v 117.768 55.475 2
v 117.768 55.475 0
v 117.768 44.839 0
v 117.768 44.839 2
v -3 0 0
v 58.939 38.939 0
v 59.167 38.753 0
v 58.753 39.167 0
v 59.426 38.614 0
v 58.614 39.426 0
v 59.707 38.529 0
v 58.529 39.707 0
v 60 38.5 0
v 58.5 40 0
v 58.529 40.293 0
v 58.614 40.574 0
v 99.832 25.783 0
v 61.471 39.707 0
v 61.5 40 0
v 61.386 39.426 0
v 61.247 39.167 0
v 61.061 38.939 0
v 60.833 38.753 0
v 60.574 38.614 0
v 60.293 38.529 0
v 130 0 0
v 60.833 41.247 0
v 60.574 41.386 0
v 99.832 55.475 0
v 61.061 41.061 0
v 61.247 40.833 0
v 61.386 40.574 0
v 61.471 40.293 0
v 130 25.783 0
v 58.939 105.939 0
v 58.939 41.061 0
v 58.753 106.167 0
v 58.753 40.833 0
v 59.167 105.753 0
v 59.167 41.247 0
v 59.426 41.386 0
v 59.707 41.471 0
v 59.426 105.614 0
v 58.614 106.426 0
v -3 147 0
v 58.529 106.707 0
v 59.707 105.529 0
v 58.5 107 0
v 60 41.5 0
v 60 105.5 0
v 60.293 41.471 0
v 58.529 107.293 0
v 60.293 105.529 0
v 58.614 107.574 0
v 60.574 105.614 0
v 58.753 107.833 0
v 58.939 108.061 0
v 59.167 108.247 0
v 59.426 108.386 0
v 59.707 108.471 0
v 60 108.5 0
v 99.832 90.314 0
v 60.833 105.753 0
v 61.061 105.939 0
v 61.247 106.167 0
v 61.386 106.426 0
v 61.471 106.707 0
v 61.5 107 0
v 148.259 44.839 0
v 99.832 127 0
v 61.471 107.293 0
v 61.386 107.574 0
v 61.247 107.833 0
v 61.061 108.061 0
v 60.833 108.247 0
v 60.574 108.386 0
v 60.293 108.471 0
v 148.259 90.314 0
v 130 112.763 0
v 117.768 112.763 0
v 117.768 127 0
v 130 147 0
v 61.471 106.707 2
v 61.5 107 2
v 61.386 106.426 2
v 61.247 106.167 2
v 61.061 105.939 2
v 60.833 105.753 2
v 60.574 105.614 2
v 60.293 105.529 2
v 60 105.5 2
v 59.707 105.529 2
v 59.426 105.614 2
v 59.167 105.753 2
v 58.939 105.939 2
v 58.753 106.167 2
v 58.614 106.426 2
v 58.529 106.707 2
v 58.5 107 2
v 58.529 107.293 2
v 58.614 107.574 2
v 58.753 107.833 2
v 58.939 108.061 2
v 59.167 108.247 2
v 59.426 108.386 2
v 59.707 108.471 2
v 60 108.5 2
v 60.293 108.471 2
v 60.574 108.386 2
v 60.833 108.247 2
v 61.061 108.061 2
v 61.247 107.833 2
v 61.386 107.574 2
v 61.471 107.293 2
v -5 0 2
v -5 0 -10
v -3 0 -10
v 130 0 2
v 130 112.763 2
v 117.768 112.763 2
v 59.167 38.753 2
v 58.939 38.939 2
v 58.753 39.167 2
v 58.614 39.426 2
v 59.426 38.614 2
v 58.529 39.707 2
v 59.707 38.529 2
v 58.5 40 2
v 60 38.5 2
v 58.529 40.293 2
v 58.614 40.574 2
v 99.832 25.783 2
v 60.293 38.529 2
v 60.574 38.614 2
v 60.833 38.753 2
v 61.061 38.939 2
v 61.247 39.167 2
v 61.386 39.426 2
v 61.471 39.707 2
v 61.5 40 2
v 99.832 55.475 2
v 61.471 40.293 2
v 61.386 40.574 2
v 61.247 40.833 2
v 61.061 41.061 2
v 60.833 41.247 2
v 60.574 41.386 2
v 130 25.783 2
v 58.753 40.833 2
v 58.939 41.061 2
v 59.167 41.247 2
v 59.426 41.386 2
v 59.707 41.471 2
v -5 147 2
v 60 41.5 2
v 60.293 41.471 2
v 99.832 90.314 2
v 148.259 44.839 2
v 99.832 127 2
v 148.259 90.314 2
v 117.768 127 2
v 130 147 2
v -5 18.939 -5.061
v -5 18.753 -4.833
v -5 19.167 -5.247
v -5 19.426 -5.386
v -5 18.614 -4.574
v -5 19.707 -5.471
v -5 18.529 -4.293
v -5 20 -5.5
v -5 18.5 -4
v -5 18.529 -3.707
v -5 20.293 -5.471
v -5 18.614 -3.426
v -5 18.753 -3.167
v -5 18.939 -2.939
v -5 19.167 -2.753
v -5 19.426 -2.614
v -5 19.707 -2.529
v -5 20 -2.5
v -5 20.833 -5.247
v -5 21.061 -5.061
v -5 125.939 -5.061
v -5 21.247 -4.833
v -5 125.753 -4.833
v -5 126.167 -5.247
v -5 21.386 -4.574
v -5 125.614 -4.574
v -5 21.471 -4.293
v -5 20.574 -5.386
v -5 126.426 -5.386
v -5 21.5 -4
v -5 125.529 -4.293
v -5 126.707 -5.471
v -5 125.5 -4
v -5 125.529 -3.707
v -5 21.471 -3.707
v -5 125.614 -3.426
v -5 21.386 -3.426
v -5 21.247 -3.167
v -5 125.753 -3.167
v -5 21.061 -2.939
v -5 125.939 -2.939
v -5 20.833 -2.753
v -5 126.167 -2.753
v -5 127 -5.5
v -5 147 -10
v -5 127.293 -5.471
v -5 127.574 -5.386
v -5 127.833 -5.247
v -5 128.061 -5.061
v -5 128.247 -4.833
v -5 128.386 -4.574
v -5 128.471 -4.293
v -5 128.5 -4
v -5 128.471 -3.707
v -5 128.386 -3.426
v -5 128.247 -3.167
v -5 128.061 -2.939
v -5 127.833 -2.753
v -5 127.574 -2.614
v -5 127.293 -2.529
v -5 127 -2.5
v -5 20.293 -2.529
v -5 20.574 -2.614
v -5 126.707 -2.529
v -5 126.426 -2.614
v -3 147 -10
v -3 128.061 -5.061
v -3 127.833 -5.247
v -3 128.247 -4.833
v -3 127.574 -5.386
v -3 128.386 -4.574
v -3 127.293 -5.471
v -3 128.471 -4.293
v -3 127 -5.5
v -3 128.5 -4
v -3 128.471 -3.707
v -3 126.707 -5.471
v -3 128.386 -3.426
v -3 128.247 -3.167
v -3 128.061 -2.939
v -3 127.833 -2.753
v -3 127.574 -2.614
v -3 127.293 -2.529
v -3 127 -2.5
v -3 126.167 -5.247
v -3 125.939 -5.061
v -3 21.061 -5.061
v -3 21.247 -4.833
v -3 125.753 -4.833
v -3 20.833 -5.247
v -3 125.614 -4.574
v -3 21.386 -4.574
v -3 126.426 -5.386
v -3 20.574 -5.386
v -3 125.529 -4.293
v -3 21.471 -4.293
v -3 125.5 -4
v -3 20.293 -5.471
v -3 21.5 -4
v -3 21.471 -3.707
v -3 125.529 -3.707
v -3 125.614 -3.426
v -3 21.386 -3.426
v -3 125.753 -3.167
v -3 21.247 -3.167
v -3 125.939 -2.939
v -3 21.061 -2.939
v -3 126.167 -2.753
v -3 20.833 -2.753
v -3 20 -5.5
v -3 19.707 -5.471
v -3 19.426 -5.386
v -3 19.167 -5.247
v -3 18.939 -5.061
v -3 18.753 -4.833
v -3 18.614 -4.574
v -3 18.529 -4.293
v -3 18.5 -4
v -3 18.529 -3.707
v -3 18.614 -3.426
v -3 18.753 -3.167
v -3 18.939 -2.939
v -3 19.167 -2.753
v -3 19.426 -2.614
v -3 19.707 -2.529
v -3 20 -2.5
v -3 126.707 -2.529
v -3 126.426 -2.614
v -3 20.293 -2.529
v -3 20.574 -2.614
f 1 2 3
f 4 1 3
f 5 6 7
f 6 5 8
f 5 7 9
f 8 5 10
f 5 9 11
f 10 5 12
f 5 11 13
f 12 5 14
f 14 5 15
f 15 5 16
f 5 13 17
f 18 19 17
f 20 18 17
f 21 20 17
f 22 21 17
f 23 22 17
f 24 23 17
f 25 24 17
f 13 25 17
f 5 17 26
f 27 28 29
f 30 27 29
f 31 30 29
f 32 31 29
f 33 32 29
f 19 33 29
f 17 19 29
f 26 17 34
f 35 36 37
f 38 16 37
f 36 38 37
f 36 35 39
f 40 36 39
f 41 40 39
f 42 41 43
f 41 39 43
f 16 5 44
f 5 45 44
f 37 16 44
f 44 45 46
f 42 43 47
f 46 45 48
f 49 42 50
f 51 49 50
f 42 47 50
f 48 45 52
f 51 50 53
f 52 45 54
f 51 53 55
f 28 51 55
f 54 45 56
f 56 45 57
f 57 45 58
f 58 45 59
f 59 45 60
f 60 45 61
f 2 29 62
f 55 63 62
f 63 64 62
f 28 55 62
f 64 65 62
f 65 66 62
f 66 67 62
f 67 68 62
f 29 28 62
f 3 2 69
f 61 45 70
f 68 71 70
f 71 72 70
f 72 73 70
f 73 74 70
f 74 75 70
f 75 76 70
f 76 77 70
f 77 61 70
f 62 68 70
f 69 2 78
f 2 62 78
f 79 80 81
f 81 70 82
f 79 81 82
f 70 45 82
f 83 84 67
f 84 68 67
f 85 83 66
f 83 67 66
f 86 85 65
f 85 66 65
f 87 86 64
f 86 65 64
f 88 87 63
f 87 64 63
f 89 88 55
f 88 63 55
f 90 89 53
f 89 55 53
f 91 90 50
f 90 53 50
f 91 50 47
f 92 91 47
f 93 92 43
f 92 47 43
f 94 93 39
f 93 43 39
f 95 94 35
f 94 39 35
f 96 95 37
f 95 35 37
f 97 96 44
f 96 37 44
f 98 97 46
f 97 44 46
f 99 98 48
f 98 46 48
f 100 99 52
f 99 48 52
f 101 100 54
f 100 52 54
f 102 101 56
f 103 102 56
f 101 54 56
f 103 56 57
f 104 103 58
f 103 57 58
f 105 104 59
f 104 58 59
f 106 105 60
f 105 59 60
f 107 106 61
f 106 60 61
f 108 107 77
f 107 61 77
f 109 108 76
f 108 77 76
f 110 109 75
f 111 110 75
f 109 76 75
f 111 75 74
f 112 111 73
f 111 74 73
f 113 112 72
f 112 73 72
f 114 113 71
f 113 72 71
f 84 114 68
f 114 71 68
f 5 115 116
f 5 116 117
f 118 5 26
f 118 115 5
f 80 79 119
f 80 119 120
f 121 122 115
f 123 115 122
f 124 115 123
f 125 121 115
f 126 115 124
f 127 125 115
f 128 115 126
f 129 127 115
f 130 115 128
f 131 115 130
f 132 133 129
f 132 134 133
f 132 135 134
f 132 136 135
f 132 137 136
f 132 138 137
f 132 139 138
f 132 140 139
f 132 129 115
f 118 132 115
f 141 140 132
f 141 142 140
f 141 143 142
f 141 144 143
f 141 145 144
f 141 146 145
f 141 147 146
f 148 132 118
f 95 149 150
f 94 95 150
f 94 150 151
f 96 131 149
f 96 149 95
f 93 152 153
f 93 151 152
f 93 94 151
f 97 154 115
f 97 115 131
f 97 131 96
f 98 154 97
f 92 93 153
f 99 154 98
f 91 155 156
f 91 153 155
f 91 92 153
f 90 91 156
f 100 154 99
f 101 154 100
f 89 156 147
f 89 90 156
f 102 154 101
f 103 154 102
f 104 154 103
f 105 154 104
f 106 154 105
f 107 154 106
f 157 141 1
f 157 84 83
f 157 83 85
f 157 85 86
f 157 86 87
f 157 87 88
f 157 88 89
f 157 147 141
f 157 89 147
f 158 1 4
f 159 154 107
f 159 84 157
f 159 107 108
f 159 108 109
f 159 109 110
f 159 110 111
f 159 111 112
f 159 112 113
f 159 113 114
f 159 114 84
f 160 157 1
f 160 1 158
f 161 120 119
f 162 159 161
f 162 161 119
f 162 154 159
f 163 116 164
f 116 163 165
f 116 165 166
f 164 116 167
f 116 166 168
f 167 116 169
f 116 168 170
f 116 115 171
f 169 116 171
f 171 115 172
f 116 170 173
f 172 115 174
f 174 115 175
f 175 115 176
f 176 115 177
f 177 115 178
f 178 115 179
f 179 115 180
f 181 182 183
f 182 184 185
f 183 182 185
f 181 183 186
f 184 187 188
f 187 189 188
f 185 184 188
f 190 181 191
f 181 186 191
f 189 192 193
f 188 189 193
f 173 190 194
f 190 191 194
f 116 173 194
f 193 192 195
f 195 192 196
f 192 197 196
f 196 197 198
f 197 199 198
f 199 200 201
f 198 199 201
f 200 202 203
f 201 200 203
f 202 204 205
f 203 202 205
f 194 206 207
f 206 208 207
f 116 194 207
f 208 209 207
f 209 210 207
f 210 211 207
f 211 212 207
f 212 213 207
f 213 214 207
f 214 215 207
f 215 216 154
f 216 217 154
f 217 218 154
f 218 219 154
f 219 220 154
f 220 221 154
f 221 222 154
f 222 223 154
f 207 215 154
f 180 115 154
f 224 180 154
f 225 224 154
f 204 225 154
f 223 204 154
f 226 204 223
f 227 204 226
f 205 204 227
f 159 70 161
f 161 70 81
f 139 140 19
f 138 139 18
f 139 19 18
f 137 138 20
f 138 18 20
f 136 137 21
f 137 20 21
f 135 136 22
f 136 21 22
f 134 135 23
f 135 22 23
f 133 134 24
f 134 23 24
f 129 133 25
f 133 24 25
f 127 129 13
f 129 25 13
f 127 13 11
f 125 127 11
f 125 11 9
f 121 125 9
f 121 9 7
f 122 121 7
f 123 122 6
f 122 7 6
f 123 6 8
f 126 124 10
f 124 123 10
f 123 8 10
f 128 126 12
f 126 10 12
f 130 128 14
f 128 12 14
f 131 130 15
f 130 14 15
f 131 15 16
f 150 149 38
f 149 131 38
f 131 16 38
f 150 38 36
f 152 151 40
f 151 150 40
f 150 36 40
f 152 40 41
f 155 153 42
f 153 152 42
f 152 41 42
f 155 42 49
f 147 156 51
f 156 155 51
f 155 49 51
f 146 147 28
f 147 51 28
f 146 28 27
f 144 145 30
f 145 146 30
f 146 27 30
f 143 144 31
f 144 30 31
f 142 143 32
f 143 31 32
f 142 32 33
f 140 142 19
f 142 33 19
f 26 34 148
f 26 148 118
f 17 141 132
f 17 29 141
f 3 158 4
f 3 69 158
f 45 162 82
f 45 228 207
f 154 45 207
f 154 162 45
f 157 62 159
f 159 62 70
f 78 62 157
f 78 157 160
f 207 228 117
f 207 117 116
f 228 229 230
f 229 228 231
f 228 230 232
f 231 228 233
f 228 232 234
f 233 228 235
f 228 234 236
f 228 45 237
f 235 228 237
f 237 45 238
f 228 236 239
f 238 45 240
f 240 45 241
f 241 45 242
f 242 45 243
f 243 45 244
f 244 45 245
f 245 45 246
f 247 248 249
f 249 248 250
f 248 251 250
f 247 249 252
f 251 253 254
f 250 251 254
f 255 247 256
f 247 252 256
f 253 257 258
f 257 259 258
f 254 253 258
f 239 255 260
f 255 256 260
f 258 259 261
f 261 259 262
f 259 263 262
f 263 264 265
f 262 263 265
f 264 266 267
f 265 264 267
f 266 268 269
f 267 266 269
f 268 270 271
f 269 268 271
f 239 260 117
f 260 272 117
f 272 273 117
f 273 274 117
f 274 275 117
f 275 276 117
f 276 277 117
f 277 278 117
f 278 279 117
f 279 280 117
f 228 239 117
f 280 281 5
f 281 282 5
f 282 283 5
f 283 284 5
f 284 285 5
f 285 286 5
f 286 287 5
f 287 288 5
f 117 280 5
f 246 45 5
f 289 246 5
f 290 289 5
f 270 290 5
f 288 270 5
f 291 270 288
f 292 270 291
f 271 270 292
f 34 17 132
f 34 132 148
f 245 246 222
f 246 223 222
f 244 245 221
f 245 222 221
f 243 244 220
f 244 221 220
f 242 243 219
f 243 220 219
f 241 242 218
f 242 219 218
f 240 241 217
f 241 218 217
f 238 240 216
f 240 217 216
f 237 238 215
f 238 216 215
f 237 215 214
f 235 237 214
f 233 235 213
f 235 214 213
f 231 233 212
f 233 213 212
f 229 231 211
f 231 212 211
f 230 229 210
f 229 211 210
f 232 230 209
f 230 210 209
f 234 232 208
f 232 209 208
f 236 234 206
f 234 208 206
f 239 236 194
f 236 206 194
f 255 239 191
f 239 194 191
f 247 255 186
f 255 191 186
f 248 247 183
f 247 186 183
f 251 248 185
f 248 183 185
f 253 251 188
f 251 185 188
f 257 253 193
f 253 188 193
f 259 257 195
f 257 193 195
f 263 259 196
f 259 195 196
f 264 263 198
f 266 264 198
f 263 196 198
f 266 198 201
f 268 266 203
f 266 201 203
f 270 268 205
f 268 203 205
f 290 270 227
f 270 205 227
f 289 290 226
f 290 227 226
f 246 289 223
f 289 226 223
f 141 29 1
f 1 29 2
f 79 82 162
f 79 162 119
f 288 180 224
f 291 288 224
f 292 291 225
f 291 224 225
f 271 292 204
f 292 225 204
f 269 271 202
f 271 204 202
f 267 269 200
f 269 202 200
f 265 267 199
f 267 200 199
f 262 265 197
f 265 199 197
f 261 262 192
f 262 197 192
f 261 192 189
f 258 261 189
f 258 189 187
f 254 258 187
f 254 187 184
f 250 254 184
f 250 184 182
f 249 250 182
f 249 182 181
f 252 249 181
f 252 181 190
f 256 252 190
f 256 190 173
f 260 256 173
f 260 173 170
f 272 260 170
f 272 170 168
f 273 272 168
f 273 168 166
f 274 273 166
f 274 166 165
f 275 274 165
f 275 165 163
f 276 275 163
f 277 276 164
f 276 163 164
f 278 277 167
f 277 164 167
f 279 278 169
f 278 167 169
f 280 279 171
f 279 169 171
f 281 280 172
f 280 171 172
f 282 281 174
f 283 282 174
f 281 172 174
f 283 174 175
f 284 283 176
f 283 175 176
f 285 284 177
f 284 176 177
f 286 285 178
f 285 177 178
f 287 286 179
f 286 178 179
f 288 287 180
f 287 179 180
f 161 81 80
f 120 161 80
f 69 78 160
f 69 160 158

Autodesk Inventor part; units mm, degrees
ref_plane "YZ Plane" through (0, 0, 0) normal (1, 0, 0) x (0, 1, 0)
ref_plane "XZ Plane" through (0, 0, 0) normal (0, 1, 0) x (-1, 0, 0)
ref_plane "XY Plane" through (0, 0, 0) normal (0, 0, 1) x (1, 0, 0)
sketch "Sketch1" plane through (0, 0, 0) normal (0, 0, 1) x (1, 0, 0)
  line L0 (0, 0) -> (260, 0)
  line L1 (260, 0) -> (260, 125)
  line L2 (220, 147) -> (0, 147)
  line L3 (0, 147) -> (0, 0)
  circle A0 centre (240, 135) radius 8
  circle A1 centre (240, 135) radius 10
  line L4 (250, 135) -> (250.202, 135)
  line L5 (230, 135) -> (230, 137)
  arc A2 (230, 137) -> (220, 147) centre (220, 137) ccw
  line L6 (260, 147) -> (260, 147)
  line L7 (250, 135) -> (250, 137)
  line L8 (240, 125) -> (260, 125)
  line L9 (0, 73.5) -> (260, 73.5)
  line L10 (130, 112.7628) -> (117.7684, 112.7628)
  line L11 (99.8322, 119.3312) -> (99.8322, 90.3139)
  line L12 (99.8322, 90.3139) -> (148.259, 90.3139)
  line L13 (148.259, 90.3139) -> (148.259, 44.839)
  line L14 (148.259, 44.839) -> (117.7684, 44.839)
  line L15 (99.8322, 44.839) -> (99.8322, 25.7829)
  line L16 (99.8322, 25.7829) -> (130, 25.7829)
  line L17 (99.8322, 119.3312) -> (99.8322, 127)
  line L18 (99.8322, 127) -> (117.7684, 127)
  line L19 (117.7684, 127) -> (117.7684, 112.7628)
  line L20 (99.8322, 44.839) -> (99.8322, 55.475)
  line L21 (99.8322, 55.475) -> (117.7684, 55.475)
  line L22 (117.7684, 55.475) -> (117.7684, 44.839)
  line L23 (130, 147) -> (130, 112.7628)
  line L24 (130, 25.7829) -> (130, 0)
  line L25 (60, 107) -> (200, 107)
  line L26 (200, 107) -> (200, 40)
  line L27 (200, 40) -> (60, 40)
  line L28 (60, 40) -> (60, 107)
  circle A3 centre (60, 107) radius 1.5
  circle A4 centre (200, 107) radius 1.5
  circle A5 centre (200, 40) radius 1.5
  circle A6 centre (60, 40) radius 1.5
  circle A7 centre (130, 107) radius 1.5
  circle A8 centre (130, 40) radius 1.5
  line L29 (260, 125) -> (265, 125)
  line L30 (265, 0) -> (260, 0)
  line L31 (260, 0) -> (260, 125)
  line L32 (265, 0) -> (263, 0)
  line L33 (0, 147) -> (-3, 147)
  line L34 (-3, 147) -> (-3, 0)
  line L35 (-3, 0) -> (0, 0)
  line L36 (0, 0) -> (0, 147)
  line L37 (-3, 147) -> (-5, 147)
  line L38 (-5, 147) -> (-5, 0)
  line L39 (-5, 0) -> (-3, 0)
  line L40 (-3, 0) -> (-3, 147)
  point P0 (260, 67.5)
  point P1 (263, 125)
  point P2 (200, 73.5)
  point P3 (148.259, 73.5)
  point P4 (99.8322, 107)
  point P5 (128.5, 107)
  point P6 (131.5, 107)
  point P7 (198.5, 107)
  point P8 (200, 105.5)
  point P9 (60, 73.5)
  point P10 (99.8322, 40)
  dimension "d2" = 16
  dimension "d3" = 20
  dimension "d4" = 135
  dimension "d5" = 2
  dimension "d6" = 260
  dimension "d7" = 147
  dimension "d8" = 10
  dimension "d11" = 22
  dimension "d16" = 40
  dimension "d17" = 40
  dimension "d18" = 60
  dimension "d19" = 60
  dimension "d20" = 3
  dimension "d21" = 3
  dimension "d22" = 3
  dimension "d23" = 3
  dimension "d24" = 140
  dimension "d25" = 67
  dimension "d26" = 3
  dimension "d27" = 3
  dimension "d28" = 70
  dimension "d29" = 70
  dimension "d30" = 5
  dimension "d31" = 2
  dimension "d41" = 3
  dimension "d42" = 2
extrude "Extrusion1" add sketch "Sketch1" along normal blind 2 contours L3 L9 L28 A6 L27 L15 L16 L24 L0 | L35 L34 L33 L3 | L3 L2 L23 L10 L19 L18 L17 L11 L25 A3 L28 L9 | L39 L38 L37 L34 | L28 A3 L25 L11 L12 L13 L9 | L9 L13 L14 L22 L21 L20 L15 L27 A6 L28
sketch "Sketch4" plane through (0, 0, 0) normal (0, 0, -1) x (-1, 0, 0)
  line L0 (-130, 147) -> (5, 147) projected
  line L1 (5, 0) -> (-130, 0) projected
  line L2 (5, 147) -> (3, 147)
  line L3 (3, 147) -> (3, 0)
  line L4 (3, 0) -> (5, 0)
  line L5 (5, 0) -> (5, 147)
  point P0 (0, 0)
  dimension "d43" = 2
extrude "Extrusion4" add sketch "Sketch4" along normal blind 10
sketch "Sketch5" plane through (-5, 0, 2) normal (-1, 0, 0) x (0, 0, 1)
  line L0 (-12, 147) -> (-12, 0) projected
  line L1 (-2, 0) -> (-12, 0) projected
  line L2 (-12, 147) -> (-6, 147)
  line L3 (-6, 147) -> (-6, 0)
  line L4 (-6, 0) -> (-12, 0)
  line L5 (-12, 0) -> (-12, 147)
  circle A0 centre (-6, 127) radius 1.5
  circle A1 centre (-6, 20) radius 1.5
  line L6 (-12, 147) -> (0, 147) projected
  line L7 (-12, 0) -> (0, 0) projected
  point P0 (-6, 147)
  point P1 (-6, 0)
  dimension "d46" = 6
  dimension "d47" = 3
  dimension "d48" = 3
  dimension "d49" = 20
  dimension "d50" = 20
extrude "Extrusion5" cut sketch "Sketch5" against normal blind 10 contours A0 L3 | L3 A0 | A1 L3 | L3 A1
properties part number "Coffee_Machine_Base"
